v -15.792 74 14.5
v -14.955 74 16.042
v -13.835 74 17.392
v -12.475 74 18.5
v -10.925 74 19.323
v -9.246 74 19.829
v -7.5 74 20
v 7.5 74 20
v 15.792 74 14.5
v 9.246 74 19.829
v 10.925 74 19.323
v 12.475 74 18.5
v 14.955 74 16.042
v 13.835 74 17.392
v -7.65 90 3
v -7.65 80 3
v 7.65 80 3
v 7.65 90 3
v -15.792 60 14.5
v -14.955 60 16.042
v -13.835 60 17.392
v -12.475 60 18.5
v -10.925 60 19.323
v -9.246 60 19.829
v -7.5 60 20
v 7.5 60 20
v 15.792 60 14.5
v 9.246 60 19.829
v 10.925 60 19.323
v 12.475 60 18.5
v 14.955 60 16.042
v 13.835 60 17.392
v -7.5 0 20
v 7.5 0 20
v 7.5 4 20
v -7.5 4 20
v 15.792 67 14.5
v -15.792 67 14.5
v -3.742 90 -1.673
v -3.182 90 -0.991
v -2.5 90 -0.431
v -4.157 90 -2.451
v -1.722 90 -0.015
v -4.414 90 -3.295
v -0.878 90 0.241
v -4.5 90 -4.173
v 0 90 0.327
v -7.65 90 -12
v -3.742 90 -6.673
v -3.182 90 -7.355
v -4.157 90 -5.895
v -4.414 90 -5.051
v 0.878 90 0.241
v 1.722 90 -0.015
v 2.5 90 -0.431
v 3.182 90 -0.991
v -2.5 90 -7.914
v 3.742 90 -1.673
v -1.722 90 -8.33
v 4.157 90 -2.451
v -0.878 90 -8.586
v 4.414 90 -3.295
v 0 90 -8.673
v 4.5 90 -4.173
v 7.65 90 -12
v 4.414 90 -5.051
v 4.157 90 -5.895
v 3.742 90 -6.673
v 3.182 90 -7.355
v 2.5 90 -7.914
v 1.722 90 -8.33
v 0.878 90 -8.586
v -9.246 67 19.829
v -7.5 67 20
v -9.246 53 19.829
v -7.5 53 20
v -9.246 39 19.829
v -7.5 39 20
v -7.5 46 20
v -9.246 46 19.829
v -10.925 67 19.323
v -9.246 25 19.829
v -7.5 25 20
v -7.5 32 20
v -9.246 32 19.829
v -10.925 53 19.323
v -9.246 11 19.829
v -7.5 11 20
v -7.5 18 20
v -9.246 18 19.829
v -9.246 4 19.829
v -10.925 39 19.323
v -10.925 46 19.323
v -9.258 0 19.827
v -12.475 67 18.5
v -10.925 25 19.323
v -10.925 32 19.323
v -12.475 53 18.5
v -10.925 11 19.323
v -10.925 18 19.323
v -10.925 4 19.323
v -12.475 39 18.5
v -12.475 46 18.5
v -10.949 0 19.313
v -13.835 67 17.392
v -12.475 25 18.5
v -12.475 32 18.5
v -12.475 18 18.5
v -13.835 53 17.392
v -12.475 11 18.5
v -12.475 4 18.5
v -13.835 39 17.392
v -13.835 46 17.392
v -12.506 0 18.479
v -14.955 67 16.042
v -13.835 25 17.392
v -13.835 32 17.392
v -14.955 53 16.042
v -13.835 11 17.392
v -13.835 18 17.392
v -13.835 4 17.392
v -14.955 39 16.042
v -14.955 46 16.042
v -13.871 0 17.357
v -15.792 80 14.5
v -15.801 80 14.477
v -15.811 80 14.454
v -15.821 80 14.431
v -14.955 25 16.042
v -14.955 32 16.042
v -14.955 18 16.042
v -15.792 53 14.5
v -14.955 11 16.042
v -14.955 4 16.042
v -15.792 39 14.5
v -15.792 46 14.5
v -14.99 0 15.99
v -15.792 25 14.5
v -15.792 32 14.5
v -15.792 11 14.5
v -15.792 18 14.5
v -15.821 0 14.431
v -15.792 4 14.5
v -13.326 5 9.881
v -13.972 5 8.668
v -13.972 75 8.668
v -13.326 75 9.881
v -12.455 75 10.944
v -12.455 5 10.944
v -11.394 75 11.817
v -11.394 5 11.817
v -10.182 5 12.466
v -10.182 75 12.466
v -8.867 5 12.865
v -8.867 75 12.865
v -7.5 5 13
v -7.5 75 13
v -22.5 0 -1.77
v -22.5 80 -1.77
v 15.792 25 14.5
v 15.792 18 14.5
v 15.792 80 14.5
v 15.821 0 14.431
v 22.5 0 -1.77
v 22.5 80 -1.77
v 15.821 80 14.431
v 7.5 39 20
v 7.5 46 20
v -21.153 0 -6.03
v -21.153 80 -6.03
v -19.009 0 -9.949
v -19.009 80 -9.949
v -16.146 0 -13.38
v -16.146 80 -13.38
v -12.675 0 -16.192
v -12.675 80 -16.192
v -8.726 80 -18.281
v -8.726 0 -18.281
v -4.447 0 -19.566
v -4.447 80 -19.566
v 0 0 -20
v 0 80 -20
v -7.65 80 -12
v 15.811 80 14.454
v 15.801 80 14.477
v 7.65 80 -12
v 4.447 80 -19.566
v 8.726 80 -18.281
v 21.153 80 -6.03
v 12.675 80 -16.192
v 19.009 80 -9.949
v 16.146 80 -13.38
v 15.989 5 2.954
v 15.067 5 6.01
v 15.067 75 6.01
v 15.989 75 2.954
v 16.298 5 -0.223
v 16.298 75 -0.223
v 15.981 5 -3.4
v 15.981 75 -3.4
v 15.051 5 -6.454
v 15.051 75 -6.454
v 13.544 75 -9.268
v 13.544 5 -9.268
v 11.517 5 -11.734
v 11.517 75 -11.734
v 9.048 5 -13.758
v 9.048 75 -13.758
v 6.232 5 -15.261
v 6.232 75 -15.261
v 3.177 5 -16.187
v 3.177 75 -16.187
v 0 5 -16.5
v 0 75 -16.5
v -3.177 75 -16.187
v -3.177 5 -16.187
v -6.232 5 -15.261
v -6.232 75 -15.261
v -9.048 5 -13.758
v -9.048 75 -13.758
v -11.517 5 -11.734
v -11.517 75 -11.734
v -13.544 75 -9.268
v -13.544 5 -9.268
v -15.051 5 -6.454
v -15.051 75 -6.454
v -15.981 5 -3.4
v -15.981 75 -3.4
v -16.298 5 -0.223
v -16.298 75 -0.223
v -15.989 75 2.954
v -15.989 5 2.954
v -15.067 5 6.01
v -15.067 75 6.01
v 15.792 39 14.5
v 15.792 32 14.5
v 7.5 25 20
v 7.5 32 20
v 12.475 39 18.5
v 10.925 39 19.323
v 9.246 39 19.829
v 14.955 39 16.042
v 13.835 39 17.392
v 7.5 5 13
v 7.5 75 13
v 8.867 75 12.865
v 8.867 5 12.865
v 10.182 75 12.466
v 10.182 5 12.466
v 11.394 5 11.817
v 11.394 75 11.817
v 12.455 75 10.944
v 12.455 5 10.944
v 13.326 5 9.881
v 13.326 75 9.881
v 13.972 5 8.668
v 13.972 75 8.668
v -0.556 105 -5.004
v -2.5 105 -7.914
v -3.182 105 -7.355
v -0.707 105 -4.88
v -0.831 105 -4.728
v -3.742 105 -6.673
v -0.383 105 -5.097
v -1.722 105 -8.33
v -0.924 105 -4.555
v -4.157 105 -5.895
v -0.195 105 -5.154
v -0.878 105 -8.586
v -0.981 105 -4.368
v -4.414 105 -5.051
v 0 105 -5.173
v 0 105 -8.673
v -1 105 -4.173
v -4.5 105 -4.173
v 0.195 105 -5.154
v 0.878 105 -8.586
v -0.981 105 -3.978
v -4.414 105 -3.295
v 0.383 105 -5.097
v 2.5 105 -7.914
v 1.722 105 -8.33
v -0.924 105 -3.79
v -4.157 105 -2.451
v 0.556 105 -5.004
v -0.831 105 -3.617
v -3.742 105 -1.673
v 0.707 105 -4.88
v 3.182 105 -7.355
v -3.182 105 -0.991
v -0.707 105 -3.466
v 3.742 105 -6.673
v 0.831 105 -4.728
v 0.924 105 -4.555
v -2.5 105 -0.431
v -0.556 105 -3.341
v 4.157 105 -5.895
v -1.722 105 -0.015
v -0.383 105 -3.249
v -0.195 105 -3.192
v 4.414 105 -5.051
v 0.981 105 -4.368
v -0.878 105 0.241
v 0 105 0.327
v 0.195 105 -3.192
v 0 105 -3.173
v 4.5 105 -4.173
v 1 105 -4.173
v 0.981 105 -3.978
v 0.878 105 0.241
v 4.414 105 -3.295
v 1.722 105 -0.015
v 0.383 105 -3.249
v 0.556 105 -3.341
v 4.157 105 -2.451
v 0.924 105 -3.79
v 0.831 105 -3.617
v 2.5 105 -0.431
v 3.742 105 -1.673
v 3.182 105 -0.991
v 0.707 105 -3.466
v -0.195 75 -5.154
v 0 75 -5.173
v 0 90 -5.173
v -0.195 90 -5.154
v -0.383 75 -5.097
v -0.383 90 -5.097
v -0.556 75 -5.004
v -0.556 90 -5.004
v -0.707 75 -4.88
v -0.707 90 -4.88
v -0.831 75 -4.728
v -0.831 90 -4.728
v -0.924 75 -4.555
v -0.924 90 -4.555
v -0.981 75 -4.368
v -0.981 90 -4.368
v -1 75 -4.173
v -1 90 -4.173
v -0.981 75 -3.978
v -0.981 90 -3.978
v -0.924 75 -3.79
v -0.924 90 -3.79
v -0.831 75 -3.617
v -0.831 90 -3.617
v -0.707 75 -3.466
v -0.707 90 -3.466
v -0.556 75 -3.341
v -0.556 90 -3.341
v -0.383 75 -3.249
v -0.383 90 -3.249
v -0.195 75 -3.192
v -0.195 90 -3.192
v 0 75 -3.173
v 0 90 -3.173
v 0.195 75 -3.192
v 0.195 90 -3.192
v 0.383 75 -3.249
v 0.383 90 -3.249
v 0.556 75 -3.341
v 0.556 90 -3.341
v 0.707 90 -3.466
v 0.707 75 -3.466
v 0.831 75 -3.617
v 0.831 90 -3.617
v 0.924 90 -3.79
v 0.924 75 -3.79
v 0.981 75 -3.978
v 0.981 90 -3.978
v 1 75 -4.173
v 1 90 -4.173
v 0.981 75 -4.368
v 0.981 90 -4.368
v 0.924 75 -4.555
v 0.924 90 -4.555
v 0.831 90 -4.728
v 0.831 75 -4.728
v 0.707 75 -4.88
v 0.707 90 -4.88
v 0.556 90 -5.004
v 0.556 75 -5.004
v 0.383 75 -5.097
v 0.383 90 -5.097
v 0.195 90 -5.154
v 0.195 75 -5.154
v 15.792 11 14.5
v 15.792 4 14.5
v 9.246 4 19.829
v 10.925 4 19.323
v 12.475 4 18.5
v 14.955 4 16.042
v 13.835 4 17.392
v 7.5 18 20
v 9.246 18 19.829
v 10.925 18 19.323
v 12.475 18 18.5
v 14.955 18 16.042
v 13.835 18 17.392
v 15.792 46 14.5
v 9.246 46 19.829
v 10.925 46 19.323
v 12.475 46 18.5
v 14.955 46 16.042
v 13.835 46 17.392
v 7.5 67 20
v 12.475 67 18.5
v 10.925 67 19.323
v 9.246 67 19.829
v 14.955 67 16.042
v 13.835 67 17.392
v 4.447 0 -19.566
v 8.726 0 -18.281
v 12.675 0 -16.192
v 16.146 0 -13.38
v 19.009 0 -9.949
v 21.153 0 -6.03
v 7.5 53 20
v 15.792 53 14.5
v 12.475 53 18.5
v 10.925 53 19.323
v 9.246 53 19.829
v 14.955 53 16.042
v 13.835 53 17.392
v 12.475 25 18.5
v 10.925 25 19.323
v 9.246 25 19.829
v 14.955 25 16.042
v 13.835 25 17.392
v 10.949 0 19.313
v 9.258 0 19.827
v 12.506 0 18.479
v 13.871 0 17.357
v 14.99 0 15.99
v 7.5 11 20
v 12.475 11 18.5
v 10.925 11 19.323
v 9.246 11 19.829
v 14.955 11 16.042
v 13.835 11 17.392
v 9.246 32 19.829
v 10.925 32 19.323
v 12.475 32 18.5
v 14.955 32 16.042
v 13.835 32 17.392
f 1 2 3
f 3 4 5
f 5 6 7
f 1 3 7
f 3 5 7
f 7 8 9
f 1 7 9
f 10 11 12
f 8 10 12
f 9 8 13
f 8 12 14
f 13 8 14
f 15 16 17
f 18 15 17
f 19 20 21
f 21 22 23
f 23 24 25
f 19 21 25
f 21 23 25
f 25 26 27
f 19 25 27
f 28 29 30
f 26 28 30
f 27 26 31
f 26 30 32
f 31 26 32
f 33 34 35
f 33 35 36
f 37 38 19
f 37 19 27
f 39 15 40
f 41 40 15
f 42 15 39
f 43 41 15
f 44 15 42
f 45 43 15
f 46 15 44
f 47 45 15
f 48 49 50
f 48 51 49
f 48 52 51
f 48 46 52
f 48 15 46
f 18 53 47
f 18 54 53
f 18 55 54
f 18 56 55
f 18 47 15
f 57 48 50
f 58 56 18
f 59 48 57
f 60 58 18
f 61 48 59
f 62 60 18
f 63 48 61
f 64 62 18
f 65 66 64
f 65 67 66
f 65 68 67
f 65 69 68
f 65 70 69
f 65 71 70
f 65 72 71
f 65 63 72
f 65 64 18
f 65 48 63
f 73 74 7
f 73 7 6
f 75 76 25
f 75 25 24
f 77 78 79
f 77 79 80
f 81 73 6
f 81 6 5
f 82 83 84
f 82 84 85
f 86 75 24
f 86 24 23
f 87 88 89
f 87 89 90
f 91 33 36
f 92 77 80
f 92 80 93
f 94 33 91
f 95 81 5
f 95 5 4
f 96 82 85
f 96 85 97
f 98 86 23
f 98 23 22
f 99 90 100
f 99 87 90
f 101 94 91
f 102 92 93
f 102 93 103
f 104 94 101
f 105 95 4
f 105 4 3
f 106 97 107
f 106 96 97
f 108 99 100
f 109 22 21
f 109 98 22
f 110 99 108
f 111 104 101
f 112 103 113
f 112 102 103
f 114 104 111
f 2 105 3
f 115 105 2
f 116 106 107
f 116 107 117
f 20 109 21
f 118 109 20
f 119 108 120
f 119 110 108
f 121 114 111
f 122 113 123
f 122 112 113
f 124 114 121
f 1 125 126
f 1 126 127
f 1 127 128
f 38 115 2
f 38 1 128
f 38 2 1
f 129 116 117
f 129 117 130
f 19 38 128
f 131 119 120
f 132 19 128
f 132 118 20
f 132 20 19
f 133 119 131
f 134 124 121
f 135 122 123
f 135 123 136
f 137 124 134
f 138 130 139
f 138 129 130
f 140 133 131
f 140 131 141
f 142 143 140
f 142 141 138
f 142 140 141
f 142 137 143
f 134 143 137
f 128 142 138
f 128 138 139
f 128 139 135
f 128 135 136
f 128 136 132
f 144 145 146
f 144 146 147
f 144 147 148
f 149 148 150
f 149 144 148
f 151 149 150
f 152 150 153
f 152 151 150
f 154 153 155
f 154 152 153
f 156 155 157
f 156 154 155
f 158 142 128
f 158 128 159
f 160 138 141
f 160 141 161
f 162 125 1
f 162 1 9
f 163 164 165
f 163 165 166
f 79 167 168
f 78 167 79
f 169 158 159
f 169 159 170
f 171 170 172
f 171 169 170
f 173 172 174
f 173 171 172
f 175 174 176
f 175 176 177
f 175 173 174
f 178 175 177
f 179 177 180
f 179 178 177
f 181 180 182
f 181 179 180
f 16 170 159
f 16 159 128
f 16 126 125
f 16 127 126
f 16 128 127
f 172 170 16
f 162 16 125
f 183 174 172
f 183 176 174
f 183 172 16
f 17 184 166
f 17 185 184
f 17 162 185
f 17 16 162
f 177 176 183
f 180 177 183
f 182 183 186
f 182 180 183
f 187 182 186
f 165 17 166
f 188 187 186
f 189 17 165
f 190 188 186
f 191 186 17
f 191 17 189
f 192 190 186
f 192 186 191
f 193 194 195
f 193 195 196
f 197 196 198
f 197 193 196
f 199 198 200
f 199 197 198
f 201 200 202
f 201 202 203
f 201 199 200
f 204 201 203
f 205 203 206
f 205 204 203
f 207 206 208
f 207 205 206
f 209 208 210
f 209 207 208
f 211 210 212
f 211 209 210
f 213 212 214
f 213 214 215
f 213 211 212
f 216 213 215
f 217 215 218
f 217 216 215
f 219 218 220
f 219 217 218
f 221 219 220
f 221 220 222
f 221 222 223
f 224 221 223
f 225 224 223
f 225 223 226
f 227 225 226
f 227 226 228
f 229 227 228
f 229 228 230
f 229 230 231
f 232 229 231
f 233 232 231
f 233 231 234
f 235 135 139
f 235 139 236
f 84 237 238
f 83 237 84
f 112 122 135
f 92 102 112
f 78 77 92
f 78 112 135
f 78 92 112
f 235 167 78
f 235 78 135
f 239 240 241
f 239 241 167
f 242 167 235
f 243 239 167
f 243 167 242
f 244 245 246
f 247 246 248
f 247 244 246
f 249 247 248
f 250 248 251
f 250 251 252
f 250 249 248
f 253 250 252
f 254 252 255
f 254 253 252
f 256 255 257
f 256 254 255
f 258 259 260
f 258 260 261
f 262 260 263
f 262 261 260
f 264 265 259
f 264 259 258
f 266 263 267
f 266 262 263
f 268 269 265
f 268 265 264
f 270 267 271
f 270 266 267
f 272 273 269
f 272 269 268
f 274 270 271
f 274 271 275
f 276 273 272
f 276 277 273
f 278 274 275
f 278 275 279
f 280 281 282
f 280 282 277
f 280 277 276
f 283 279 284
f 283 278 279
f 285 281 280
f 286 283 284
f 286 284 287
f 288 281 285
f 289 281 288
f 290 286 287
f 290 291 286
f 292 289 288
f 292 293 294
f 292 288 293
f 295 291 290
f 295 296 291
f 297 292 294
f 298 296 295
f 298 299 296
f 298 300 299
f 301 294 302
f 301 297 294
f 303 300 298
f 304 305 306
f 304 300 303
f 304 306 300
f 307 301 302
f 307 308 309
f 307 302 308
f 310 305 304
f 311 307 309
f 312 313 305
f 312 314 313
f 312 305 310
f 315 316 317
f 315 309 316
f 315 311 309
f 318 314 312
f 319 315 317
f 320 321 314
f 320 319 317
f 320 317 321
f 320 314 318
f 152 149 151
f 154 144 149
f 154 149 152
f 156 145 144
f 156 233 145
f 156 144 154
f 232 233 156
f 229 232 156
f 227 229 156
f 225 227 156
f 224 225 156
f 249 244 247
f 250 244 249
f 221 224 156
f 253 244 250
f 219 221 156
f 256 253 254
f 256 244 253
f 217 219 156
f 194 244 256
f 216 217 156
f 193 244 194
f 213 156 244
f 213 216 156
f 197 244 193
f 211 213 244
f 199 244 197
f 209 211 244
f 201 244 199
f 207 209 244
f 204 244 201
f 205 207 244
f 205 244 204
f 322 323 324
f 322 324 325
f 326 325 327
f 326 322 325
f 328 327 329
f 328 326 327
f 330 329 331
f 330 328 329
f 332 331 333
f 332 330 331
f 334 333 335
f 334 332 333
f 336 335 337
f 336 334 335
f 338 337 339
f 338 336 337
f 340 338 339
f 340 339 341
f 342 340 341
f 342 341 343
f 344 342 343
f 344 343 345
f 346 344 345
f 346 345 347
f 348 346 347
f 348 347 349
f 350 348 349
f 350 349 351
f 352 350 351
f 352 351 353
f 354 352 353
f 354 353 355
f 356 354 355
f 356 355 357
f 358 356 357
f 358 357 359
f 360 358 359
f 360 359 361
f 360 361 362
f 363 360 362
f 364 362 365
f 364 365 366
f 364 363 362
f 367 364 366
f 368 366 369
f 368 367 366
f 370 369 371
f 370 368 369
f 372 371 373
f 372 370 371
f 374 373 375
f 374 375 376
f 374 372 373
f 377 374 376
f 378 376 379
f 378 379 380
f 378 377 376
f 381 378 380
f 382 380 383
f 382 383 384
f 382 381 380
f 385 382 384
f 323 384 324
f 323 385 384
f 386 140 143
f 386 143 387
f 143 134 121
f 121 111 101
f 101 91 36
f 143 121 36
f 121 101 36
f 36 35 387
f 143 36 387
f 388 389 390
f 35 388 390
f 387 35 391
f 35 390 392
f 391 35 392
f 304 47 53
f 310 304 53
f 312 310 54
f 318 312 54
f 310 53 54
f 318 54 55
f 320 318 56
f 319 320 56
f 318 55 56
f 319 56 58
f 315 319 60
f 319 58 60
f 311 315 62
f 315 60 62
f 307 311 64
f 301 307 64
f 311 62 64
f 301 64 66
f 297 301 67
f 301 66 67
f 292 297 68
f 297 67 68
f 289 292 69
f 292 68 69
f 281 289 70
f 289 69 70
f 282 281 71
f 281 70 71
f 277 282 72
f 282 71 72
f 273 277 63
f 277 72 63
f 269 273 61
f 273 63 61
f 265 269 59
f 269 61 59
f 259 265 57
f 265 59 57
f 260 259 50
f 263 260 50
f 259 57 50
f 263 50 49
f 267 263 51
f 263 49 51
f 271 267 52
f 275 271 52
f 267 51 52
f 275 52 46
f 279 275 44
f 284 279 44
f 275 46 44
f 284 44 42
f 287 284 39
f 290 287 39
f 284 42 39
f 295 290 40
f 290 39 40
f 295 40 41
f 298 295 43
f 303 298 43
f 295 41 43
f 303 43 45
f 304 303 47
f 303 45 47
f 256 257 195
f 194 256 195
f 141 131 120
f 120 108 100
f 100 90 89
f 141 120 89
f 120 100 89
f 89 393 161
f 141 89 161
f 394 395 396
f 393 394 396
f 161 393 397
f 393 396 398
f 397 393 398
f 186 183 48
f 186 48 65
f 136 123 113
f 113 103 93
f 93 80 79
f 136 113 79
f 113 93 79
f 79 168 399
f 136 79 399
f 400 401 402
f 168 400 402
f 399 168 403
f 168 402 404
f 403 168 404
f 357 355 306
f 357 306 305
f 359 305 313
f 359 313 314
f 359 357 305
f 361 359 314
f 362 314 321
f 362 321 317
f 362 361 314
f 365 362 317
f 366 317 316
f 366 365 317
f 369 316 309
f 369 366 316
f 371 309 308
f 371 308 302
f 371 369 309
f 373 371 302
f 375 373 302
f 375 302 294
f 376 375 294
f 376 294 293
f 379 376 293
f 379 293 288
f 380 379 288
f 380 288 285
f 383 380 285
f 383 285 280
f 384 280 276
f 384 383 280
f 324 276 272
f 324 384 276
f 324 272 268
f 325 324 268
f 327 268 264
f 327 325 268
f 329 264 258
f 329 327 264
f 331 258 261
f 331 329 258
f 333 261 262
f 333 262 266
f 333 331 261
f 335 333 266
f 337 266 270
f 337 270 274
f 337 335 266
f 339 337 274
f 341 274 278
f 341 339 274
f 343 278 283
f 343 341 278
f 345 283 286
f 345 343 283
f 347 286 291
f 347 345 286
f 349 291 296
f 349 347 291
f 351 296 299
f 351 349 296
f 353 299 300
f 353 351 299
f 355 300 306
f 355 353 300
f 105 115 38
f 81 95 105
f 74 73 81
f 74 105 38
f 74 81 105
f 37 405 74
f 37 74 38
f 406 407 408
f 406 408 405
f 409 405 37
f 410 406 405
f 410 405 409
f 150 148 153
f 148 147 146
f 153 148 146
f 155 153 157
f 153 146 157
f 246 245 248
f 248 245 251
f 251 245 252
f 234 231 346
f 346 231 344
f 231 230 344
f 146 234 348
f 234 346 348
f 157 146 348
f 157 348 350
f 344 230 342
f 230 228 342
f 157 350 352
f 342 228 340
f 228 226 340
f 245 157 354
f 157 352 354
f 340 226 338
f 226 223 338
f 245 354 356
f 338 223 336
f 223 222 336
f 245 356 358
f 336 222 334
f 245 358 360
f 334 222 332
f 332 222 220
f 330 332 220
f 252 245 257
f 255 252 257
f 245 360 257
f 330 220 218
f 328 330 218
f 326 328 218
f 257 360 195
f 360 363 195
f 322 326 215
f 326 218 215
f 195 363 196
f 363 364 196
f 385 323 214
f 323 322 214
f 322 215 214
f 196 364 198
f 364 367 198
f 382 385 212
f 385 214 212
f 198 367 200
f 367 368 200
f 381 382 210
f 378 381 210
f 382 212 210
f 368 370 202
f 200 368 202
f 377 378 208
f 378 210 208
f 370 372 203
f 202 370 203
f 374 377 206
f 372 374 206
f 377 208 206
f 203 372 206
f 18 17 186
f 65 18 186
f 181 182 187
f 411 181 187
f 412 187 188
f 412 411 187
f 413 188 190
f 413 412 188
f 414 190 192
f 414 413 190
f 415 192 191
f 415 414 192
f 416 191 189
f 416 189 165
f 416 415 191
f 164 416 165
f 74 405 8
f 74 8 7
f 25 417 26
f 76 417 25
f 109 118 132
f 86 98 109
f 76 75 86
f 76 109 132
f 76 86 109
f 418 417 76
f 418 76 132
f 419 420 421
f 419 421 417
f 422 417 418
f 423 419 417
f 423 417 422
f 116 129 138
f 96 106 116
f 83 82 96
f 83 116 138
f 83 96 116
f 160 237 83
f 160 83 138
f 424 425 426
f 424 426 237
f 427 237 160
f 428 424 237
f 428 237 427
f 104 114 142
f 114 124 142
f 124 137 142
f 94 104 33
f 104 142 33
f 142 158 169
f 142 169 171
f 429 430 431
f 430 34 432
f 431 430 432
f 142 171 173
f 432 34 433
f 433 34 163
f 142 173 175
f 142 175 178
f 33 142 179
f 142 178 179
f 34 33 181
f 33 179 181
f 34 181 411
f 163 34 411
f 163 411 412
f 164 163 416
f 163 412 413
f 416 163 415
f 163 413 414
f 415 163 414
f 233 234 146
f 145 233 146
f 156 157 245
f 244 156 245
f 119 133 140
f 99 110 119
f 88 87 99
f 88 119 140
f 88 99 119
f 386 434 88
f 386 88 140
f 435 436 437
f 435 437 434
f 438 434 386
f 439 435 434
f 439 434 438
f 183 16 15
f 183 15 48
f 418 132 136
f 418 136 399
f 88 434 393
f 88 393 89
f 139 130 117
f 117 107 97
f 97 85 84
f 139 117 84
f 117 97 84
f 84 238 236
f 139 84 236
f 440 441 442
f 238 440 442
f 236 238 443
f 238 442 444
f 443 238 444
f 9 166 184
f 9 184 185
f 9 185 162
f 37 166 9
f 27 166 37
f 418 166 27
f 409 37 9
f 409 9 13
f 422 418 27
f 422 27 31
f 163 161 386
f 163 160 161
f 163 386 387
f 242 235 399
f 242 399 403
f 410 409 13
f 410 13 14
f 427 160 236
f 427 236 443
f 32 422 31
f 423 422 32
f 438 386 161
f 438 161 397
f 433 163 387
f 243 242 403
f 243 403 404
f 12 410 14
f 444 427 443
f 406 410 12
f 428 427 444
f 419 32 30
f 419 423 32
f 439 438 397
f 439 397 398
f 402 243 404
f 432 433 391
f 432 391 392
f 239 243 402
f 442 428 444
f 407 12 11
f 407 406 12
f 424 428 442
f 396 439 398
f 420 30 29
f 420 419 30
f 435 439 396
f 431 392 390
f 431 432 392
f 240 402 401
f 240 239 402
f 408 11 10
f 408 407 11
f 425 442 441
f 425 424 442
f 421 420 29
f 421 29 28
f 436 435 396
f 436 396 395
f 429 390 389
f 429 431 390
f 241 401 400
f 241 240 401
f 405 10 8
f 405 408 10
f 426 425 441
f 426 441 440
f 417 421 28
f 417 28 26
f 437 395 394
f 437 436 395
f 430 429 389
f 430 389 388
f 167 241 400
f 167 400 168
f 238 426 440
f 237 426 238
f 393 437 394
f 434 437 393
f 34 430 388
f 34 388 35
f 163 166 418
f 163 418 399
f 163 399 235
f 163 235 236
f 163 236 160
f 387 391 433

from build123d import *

# Parameters (mm, degrees)
BOSS_EXTRUDE1_DEPTH     = 80
BOSS_EXTRUDE2_DEPTH     = 5
BOSS_EXTRUDE3_START     = 75
BOSS_EXTRUDE3_DEPTH     = 5
CUT_EXTRUDE1_START      = 20
SKETCH2_W               = 31.64103086
SKETCH2_H               = 7
SKETCH2_H_2             = 6
CUT_EXTRUDE1_DEPTH      = 5.5
CROQUIS1_W              = 15.3
CROQUIS1_H              = 15
SALIENTE_EXTRUIR1_DEPTH = 10
CROQUIS2_R              = 4.5
CROQUIS2_R_2            = 1
SALIENTE_EXTRUIR2_DEPTH = 15
CORTAR_EXTRUIR1_START   = -24
CROQUIS2_2_R            = 1
CORTAR_EXTRUIR1_DEPTH   = 24


# Read off the part's stored shape, not the designer's step: Boss-Extrude3
with BuildPart() as part:
    # Sketch1 → Boss-Extrude1 (new body)
    with BuildSketch(Plane(origin=(0, 0, 0), x_dir=(1, 0, 0), z_dir=(0, 1, 0))):
        with BuildLine():
            Line((7.5, -20), (-7.5, -20))
            ThreePointArc((-7.5, -20), (-12.50622569, -18.479151312), (-15.82051543, -14.430600965))
            Line((-15.82051543, -14.430600965), (-22.5, 1.769696007))
            ThreePointArc((-22.5, 1.769696007), (-14.479243624, 14.870408615), (0, 20))
            ThreePointArc((0, 20), (14.479243624, 14.870408615), (22.5, 1.769696007))
            Line((22.5, 1.769696007), (15.82051543, -14.430600965))
            ThreePointArc((15.82051543, -14.430600965), (12.50622569, -18.479151312), (7.5, -20))
        make_face()
        with BuildLine():
            Line((-7.5, -13), (7.5, -13))
            ThreePointArc((7.5, -13), (11.393731092, -11.817117687), (13.971512001, -8.668245195))
            Line((13.971512001, -8.668245195), (15.06741388, -6.010265271))
            ThreePointArc((15.06741388, -6.010265271), (0, 16.5), (-15.06741388, -6.010265271))
            Line((-15.06741388, -6.010265271), (-13.971512001, -8.668245195))
            ThreePointArc((-13.971512001, -8.668245195), (-11.393731092, -11.817117687), (-7.5, -13))
        make_face(mode=Mode.SUBTRACT)
    extrude(amount=BOSS_EXTRUDE1_DEPTH)

    # Sketch1<2> → Boss-Extrude2 (add)
    with BuildSketch(Plane(origin=(0, 0, 0), x_dir=(1, 0, 0), z_dir=(0, 1, 0))):
        with BuildLine():
            ThreePointArc((-13.971512001, -8.668245195), (-11.393731092, -11.817117687), (-7.5, -13))
            Line((-7.5, -13), (7.5, -13))
            ThreePointArc((7.5, -13), (11.393731092, -11.817117687), (13.971512001, -8.668245195))
            Line((13.971512001, -8.668245195), (15.06741388, -6.010265271))
            ThreePointArc((15.06741388, -6.010265271), (0, 16.5), (-15.06741388, -6.010265271))
            Line((-15.06741388, -6.010265271), (-13.971512001, -8.668245195))
        make_face()
    extrude(amount=BOSS_EXTRUDE2_DEPTH)

    # Boss-Extrude3 outline → Boss-Extrude3 (add)
    with BuildSketch(Plane(origin=(0, 0, 0), x_dir=(1, 0, 0), z_dir=(0, 1, 0)).offset(BOSS_EXTRUDE3_START)):
        with BuildLine():
            Line((-15.06741388, -6.010265271), (-13.971512001, -8.668245195))
            ThreePointArc((-13.971512001, -8.668245195), (-11.393731092, -11.817117687), (-7.5, -13))
            Line((-7.5, -13), (7.5, -13))
            ThreePointArc((7.5, -13), (11.393731092, -11.817117687), (13.971512001, -8.668245195))
            Line((13.971512001, -8.668245195), (15.06741388, -6.010265271))
            ThreePointArc((15.06741388, -6.010265271), (0, 16.5), (-15.06741388, -6.010265271))
        make_face()
    extrude(amount=BOSS_EXTRUDE3_DEPTH)

    # Sketch2 → Cut-Extrude1 (cut)
    with BuildSketch(Plane.XY.offset(CUT_EXTRUDE1_START)):
        with Locations((0, 7.5)):
            Rectangle(SKETCH2_W, SKETCH2_H)
        with Locations((0, 21.5)):
            Rectangle(SKETCH2_W, SKETCH2_H)
        with Locations((0, 35.5)):
            Rectangle(SKETCH2_W, SKETCH2_H)
        with Locations((0, 49.5)):
            Rectangle(SKETCH2_W, SKETCH2_H)
        with Locations((0, 63.5)):
            Rectangle(SKETCH2_W, SKETCH2_H)
        with Locations((0, 77)):
            Rectangle(SKETCH2_W, SKETCH2_H_2)
    extrude(amount=-CUT_EXTRUDE1_DEPTH, mode=Mode.SUBTRACT)

    # Croquis1 → Saliente-Extruir1 (add)
    with BuildSketch(Plane(origin=(0, 80, 0), x_dir=(1, 0, 0), z_dir=(0, 1, 0))):
        with Locations((0, 4.5)):
            Rectangle(CROQUIS1_W, CROQUIS1_H)
    extrude(amount=SALIENTE_EXTRUIR1_DEPTH)

    # Croquis2 → Saliente-Extruir2 (add)
    with BuildSketch(Plane(origin=(0, 90, 0), x_dir=(1, 0, 0), z_dir=(0, 1, 0))):
        with Locations(Location((0, 4.172752701, 0), (0, 0, 270))):
            Circle(CROQUIS2_R)
        with Locations(Location((0, 4.172752701, 0), (0, 0, 270))):
            Circle(CROQUIS2_R_2, mode=Mode.SUBTRACT)
    extrude(amount=SALIENTE_EXTRUIR2_DEPTH)

    # Croquis2<2> → Cortar-Extruir1 (cut)
    with BuildSketch(Plane(origin=(0, 90, 0), x_dir=(1, 0, 0), z_dir=(0, 1, 0)).offset(CORTAR_EXTRUIR1_START)):
        with Locations(Location((0, 4.172752701, 0), (0, 0, 90))):
            Circle(CROQUIS2_2_R)
    extrude(amount=CORTAR_EXTRUIR1_DEPTH, mode=Mode.SUBTRACT)


solid = part.part
